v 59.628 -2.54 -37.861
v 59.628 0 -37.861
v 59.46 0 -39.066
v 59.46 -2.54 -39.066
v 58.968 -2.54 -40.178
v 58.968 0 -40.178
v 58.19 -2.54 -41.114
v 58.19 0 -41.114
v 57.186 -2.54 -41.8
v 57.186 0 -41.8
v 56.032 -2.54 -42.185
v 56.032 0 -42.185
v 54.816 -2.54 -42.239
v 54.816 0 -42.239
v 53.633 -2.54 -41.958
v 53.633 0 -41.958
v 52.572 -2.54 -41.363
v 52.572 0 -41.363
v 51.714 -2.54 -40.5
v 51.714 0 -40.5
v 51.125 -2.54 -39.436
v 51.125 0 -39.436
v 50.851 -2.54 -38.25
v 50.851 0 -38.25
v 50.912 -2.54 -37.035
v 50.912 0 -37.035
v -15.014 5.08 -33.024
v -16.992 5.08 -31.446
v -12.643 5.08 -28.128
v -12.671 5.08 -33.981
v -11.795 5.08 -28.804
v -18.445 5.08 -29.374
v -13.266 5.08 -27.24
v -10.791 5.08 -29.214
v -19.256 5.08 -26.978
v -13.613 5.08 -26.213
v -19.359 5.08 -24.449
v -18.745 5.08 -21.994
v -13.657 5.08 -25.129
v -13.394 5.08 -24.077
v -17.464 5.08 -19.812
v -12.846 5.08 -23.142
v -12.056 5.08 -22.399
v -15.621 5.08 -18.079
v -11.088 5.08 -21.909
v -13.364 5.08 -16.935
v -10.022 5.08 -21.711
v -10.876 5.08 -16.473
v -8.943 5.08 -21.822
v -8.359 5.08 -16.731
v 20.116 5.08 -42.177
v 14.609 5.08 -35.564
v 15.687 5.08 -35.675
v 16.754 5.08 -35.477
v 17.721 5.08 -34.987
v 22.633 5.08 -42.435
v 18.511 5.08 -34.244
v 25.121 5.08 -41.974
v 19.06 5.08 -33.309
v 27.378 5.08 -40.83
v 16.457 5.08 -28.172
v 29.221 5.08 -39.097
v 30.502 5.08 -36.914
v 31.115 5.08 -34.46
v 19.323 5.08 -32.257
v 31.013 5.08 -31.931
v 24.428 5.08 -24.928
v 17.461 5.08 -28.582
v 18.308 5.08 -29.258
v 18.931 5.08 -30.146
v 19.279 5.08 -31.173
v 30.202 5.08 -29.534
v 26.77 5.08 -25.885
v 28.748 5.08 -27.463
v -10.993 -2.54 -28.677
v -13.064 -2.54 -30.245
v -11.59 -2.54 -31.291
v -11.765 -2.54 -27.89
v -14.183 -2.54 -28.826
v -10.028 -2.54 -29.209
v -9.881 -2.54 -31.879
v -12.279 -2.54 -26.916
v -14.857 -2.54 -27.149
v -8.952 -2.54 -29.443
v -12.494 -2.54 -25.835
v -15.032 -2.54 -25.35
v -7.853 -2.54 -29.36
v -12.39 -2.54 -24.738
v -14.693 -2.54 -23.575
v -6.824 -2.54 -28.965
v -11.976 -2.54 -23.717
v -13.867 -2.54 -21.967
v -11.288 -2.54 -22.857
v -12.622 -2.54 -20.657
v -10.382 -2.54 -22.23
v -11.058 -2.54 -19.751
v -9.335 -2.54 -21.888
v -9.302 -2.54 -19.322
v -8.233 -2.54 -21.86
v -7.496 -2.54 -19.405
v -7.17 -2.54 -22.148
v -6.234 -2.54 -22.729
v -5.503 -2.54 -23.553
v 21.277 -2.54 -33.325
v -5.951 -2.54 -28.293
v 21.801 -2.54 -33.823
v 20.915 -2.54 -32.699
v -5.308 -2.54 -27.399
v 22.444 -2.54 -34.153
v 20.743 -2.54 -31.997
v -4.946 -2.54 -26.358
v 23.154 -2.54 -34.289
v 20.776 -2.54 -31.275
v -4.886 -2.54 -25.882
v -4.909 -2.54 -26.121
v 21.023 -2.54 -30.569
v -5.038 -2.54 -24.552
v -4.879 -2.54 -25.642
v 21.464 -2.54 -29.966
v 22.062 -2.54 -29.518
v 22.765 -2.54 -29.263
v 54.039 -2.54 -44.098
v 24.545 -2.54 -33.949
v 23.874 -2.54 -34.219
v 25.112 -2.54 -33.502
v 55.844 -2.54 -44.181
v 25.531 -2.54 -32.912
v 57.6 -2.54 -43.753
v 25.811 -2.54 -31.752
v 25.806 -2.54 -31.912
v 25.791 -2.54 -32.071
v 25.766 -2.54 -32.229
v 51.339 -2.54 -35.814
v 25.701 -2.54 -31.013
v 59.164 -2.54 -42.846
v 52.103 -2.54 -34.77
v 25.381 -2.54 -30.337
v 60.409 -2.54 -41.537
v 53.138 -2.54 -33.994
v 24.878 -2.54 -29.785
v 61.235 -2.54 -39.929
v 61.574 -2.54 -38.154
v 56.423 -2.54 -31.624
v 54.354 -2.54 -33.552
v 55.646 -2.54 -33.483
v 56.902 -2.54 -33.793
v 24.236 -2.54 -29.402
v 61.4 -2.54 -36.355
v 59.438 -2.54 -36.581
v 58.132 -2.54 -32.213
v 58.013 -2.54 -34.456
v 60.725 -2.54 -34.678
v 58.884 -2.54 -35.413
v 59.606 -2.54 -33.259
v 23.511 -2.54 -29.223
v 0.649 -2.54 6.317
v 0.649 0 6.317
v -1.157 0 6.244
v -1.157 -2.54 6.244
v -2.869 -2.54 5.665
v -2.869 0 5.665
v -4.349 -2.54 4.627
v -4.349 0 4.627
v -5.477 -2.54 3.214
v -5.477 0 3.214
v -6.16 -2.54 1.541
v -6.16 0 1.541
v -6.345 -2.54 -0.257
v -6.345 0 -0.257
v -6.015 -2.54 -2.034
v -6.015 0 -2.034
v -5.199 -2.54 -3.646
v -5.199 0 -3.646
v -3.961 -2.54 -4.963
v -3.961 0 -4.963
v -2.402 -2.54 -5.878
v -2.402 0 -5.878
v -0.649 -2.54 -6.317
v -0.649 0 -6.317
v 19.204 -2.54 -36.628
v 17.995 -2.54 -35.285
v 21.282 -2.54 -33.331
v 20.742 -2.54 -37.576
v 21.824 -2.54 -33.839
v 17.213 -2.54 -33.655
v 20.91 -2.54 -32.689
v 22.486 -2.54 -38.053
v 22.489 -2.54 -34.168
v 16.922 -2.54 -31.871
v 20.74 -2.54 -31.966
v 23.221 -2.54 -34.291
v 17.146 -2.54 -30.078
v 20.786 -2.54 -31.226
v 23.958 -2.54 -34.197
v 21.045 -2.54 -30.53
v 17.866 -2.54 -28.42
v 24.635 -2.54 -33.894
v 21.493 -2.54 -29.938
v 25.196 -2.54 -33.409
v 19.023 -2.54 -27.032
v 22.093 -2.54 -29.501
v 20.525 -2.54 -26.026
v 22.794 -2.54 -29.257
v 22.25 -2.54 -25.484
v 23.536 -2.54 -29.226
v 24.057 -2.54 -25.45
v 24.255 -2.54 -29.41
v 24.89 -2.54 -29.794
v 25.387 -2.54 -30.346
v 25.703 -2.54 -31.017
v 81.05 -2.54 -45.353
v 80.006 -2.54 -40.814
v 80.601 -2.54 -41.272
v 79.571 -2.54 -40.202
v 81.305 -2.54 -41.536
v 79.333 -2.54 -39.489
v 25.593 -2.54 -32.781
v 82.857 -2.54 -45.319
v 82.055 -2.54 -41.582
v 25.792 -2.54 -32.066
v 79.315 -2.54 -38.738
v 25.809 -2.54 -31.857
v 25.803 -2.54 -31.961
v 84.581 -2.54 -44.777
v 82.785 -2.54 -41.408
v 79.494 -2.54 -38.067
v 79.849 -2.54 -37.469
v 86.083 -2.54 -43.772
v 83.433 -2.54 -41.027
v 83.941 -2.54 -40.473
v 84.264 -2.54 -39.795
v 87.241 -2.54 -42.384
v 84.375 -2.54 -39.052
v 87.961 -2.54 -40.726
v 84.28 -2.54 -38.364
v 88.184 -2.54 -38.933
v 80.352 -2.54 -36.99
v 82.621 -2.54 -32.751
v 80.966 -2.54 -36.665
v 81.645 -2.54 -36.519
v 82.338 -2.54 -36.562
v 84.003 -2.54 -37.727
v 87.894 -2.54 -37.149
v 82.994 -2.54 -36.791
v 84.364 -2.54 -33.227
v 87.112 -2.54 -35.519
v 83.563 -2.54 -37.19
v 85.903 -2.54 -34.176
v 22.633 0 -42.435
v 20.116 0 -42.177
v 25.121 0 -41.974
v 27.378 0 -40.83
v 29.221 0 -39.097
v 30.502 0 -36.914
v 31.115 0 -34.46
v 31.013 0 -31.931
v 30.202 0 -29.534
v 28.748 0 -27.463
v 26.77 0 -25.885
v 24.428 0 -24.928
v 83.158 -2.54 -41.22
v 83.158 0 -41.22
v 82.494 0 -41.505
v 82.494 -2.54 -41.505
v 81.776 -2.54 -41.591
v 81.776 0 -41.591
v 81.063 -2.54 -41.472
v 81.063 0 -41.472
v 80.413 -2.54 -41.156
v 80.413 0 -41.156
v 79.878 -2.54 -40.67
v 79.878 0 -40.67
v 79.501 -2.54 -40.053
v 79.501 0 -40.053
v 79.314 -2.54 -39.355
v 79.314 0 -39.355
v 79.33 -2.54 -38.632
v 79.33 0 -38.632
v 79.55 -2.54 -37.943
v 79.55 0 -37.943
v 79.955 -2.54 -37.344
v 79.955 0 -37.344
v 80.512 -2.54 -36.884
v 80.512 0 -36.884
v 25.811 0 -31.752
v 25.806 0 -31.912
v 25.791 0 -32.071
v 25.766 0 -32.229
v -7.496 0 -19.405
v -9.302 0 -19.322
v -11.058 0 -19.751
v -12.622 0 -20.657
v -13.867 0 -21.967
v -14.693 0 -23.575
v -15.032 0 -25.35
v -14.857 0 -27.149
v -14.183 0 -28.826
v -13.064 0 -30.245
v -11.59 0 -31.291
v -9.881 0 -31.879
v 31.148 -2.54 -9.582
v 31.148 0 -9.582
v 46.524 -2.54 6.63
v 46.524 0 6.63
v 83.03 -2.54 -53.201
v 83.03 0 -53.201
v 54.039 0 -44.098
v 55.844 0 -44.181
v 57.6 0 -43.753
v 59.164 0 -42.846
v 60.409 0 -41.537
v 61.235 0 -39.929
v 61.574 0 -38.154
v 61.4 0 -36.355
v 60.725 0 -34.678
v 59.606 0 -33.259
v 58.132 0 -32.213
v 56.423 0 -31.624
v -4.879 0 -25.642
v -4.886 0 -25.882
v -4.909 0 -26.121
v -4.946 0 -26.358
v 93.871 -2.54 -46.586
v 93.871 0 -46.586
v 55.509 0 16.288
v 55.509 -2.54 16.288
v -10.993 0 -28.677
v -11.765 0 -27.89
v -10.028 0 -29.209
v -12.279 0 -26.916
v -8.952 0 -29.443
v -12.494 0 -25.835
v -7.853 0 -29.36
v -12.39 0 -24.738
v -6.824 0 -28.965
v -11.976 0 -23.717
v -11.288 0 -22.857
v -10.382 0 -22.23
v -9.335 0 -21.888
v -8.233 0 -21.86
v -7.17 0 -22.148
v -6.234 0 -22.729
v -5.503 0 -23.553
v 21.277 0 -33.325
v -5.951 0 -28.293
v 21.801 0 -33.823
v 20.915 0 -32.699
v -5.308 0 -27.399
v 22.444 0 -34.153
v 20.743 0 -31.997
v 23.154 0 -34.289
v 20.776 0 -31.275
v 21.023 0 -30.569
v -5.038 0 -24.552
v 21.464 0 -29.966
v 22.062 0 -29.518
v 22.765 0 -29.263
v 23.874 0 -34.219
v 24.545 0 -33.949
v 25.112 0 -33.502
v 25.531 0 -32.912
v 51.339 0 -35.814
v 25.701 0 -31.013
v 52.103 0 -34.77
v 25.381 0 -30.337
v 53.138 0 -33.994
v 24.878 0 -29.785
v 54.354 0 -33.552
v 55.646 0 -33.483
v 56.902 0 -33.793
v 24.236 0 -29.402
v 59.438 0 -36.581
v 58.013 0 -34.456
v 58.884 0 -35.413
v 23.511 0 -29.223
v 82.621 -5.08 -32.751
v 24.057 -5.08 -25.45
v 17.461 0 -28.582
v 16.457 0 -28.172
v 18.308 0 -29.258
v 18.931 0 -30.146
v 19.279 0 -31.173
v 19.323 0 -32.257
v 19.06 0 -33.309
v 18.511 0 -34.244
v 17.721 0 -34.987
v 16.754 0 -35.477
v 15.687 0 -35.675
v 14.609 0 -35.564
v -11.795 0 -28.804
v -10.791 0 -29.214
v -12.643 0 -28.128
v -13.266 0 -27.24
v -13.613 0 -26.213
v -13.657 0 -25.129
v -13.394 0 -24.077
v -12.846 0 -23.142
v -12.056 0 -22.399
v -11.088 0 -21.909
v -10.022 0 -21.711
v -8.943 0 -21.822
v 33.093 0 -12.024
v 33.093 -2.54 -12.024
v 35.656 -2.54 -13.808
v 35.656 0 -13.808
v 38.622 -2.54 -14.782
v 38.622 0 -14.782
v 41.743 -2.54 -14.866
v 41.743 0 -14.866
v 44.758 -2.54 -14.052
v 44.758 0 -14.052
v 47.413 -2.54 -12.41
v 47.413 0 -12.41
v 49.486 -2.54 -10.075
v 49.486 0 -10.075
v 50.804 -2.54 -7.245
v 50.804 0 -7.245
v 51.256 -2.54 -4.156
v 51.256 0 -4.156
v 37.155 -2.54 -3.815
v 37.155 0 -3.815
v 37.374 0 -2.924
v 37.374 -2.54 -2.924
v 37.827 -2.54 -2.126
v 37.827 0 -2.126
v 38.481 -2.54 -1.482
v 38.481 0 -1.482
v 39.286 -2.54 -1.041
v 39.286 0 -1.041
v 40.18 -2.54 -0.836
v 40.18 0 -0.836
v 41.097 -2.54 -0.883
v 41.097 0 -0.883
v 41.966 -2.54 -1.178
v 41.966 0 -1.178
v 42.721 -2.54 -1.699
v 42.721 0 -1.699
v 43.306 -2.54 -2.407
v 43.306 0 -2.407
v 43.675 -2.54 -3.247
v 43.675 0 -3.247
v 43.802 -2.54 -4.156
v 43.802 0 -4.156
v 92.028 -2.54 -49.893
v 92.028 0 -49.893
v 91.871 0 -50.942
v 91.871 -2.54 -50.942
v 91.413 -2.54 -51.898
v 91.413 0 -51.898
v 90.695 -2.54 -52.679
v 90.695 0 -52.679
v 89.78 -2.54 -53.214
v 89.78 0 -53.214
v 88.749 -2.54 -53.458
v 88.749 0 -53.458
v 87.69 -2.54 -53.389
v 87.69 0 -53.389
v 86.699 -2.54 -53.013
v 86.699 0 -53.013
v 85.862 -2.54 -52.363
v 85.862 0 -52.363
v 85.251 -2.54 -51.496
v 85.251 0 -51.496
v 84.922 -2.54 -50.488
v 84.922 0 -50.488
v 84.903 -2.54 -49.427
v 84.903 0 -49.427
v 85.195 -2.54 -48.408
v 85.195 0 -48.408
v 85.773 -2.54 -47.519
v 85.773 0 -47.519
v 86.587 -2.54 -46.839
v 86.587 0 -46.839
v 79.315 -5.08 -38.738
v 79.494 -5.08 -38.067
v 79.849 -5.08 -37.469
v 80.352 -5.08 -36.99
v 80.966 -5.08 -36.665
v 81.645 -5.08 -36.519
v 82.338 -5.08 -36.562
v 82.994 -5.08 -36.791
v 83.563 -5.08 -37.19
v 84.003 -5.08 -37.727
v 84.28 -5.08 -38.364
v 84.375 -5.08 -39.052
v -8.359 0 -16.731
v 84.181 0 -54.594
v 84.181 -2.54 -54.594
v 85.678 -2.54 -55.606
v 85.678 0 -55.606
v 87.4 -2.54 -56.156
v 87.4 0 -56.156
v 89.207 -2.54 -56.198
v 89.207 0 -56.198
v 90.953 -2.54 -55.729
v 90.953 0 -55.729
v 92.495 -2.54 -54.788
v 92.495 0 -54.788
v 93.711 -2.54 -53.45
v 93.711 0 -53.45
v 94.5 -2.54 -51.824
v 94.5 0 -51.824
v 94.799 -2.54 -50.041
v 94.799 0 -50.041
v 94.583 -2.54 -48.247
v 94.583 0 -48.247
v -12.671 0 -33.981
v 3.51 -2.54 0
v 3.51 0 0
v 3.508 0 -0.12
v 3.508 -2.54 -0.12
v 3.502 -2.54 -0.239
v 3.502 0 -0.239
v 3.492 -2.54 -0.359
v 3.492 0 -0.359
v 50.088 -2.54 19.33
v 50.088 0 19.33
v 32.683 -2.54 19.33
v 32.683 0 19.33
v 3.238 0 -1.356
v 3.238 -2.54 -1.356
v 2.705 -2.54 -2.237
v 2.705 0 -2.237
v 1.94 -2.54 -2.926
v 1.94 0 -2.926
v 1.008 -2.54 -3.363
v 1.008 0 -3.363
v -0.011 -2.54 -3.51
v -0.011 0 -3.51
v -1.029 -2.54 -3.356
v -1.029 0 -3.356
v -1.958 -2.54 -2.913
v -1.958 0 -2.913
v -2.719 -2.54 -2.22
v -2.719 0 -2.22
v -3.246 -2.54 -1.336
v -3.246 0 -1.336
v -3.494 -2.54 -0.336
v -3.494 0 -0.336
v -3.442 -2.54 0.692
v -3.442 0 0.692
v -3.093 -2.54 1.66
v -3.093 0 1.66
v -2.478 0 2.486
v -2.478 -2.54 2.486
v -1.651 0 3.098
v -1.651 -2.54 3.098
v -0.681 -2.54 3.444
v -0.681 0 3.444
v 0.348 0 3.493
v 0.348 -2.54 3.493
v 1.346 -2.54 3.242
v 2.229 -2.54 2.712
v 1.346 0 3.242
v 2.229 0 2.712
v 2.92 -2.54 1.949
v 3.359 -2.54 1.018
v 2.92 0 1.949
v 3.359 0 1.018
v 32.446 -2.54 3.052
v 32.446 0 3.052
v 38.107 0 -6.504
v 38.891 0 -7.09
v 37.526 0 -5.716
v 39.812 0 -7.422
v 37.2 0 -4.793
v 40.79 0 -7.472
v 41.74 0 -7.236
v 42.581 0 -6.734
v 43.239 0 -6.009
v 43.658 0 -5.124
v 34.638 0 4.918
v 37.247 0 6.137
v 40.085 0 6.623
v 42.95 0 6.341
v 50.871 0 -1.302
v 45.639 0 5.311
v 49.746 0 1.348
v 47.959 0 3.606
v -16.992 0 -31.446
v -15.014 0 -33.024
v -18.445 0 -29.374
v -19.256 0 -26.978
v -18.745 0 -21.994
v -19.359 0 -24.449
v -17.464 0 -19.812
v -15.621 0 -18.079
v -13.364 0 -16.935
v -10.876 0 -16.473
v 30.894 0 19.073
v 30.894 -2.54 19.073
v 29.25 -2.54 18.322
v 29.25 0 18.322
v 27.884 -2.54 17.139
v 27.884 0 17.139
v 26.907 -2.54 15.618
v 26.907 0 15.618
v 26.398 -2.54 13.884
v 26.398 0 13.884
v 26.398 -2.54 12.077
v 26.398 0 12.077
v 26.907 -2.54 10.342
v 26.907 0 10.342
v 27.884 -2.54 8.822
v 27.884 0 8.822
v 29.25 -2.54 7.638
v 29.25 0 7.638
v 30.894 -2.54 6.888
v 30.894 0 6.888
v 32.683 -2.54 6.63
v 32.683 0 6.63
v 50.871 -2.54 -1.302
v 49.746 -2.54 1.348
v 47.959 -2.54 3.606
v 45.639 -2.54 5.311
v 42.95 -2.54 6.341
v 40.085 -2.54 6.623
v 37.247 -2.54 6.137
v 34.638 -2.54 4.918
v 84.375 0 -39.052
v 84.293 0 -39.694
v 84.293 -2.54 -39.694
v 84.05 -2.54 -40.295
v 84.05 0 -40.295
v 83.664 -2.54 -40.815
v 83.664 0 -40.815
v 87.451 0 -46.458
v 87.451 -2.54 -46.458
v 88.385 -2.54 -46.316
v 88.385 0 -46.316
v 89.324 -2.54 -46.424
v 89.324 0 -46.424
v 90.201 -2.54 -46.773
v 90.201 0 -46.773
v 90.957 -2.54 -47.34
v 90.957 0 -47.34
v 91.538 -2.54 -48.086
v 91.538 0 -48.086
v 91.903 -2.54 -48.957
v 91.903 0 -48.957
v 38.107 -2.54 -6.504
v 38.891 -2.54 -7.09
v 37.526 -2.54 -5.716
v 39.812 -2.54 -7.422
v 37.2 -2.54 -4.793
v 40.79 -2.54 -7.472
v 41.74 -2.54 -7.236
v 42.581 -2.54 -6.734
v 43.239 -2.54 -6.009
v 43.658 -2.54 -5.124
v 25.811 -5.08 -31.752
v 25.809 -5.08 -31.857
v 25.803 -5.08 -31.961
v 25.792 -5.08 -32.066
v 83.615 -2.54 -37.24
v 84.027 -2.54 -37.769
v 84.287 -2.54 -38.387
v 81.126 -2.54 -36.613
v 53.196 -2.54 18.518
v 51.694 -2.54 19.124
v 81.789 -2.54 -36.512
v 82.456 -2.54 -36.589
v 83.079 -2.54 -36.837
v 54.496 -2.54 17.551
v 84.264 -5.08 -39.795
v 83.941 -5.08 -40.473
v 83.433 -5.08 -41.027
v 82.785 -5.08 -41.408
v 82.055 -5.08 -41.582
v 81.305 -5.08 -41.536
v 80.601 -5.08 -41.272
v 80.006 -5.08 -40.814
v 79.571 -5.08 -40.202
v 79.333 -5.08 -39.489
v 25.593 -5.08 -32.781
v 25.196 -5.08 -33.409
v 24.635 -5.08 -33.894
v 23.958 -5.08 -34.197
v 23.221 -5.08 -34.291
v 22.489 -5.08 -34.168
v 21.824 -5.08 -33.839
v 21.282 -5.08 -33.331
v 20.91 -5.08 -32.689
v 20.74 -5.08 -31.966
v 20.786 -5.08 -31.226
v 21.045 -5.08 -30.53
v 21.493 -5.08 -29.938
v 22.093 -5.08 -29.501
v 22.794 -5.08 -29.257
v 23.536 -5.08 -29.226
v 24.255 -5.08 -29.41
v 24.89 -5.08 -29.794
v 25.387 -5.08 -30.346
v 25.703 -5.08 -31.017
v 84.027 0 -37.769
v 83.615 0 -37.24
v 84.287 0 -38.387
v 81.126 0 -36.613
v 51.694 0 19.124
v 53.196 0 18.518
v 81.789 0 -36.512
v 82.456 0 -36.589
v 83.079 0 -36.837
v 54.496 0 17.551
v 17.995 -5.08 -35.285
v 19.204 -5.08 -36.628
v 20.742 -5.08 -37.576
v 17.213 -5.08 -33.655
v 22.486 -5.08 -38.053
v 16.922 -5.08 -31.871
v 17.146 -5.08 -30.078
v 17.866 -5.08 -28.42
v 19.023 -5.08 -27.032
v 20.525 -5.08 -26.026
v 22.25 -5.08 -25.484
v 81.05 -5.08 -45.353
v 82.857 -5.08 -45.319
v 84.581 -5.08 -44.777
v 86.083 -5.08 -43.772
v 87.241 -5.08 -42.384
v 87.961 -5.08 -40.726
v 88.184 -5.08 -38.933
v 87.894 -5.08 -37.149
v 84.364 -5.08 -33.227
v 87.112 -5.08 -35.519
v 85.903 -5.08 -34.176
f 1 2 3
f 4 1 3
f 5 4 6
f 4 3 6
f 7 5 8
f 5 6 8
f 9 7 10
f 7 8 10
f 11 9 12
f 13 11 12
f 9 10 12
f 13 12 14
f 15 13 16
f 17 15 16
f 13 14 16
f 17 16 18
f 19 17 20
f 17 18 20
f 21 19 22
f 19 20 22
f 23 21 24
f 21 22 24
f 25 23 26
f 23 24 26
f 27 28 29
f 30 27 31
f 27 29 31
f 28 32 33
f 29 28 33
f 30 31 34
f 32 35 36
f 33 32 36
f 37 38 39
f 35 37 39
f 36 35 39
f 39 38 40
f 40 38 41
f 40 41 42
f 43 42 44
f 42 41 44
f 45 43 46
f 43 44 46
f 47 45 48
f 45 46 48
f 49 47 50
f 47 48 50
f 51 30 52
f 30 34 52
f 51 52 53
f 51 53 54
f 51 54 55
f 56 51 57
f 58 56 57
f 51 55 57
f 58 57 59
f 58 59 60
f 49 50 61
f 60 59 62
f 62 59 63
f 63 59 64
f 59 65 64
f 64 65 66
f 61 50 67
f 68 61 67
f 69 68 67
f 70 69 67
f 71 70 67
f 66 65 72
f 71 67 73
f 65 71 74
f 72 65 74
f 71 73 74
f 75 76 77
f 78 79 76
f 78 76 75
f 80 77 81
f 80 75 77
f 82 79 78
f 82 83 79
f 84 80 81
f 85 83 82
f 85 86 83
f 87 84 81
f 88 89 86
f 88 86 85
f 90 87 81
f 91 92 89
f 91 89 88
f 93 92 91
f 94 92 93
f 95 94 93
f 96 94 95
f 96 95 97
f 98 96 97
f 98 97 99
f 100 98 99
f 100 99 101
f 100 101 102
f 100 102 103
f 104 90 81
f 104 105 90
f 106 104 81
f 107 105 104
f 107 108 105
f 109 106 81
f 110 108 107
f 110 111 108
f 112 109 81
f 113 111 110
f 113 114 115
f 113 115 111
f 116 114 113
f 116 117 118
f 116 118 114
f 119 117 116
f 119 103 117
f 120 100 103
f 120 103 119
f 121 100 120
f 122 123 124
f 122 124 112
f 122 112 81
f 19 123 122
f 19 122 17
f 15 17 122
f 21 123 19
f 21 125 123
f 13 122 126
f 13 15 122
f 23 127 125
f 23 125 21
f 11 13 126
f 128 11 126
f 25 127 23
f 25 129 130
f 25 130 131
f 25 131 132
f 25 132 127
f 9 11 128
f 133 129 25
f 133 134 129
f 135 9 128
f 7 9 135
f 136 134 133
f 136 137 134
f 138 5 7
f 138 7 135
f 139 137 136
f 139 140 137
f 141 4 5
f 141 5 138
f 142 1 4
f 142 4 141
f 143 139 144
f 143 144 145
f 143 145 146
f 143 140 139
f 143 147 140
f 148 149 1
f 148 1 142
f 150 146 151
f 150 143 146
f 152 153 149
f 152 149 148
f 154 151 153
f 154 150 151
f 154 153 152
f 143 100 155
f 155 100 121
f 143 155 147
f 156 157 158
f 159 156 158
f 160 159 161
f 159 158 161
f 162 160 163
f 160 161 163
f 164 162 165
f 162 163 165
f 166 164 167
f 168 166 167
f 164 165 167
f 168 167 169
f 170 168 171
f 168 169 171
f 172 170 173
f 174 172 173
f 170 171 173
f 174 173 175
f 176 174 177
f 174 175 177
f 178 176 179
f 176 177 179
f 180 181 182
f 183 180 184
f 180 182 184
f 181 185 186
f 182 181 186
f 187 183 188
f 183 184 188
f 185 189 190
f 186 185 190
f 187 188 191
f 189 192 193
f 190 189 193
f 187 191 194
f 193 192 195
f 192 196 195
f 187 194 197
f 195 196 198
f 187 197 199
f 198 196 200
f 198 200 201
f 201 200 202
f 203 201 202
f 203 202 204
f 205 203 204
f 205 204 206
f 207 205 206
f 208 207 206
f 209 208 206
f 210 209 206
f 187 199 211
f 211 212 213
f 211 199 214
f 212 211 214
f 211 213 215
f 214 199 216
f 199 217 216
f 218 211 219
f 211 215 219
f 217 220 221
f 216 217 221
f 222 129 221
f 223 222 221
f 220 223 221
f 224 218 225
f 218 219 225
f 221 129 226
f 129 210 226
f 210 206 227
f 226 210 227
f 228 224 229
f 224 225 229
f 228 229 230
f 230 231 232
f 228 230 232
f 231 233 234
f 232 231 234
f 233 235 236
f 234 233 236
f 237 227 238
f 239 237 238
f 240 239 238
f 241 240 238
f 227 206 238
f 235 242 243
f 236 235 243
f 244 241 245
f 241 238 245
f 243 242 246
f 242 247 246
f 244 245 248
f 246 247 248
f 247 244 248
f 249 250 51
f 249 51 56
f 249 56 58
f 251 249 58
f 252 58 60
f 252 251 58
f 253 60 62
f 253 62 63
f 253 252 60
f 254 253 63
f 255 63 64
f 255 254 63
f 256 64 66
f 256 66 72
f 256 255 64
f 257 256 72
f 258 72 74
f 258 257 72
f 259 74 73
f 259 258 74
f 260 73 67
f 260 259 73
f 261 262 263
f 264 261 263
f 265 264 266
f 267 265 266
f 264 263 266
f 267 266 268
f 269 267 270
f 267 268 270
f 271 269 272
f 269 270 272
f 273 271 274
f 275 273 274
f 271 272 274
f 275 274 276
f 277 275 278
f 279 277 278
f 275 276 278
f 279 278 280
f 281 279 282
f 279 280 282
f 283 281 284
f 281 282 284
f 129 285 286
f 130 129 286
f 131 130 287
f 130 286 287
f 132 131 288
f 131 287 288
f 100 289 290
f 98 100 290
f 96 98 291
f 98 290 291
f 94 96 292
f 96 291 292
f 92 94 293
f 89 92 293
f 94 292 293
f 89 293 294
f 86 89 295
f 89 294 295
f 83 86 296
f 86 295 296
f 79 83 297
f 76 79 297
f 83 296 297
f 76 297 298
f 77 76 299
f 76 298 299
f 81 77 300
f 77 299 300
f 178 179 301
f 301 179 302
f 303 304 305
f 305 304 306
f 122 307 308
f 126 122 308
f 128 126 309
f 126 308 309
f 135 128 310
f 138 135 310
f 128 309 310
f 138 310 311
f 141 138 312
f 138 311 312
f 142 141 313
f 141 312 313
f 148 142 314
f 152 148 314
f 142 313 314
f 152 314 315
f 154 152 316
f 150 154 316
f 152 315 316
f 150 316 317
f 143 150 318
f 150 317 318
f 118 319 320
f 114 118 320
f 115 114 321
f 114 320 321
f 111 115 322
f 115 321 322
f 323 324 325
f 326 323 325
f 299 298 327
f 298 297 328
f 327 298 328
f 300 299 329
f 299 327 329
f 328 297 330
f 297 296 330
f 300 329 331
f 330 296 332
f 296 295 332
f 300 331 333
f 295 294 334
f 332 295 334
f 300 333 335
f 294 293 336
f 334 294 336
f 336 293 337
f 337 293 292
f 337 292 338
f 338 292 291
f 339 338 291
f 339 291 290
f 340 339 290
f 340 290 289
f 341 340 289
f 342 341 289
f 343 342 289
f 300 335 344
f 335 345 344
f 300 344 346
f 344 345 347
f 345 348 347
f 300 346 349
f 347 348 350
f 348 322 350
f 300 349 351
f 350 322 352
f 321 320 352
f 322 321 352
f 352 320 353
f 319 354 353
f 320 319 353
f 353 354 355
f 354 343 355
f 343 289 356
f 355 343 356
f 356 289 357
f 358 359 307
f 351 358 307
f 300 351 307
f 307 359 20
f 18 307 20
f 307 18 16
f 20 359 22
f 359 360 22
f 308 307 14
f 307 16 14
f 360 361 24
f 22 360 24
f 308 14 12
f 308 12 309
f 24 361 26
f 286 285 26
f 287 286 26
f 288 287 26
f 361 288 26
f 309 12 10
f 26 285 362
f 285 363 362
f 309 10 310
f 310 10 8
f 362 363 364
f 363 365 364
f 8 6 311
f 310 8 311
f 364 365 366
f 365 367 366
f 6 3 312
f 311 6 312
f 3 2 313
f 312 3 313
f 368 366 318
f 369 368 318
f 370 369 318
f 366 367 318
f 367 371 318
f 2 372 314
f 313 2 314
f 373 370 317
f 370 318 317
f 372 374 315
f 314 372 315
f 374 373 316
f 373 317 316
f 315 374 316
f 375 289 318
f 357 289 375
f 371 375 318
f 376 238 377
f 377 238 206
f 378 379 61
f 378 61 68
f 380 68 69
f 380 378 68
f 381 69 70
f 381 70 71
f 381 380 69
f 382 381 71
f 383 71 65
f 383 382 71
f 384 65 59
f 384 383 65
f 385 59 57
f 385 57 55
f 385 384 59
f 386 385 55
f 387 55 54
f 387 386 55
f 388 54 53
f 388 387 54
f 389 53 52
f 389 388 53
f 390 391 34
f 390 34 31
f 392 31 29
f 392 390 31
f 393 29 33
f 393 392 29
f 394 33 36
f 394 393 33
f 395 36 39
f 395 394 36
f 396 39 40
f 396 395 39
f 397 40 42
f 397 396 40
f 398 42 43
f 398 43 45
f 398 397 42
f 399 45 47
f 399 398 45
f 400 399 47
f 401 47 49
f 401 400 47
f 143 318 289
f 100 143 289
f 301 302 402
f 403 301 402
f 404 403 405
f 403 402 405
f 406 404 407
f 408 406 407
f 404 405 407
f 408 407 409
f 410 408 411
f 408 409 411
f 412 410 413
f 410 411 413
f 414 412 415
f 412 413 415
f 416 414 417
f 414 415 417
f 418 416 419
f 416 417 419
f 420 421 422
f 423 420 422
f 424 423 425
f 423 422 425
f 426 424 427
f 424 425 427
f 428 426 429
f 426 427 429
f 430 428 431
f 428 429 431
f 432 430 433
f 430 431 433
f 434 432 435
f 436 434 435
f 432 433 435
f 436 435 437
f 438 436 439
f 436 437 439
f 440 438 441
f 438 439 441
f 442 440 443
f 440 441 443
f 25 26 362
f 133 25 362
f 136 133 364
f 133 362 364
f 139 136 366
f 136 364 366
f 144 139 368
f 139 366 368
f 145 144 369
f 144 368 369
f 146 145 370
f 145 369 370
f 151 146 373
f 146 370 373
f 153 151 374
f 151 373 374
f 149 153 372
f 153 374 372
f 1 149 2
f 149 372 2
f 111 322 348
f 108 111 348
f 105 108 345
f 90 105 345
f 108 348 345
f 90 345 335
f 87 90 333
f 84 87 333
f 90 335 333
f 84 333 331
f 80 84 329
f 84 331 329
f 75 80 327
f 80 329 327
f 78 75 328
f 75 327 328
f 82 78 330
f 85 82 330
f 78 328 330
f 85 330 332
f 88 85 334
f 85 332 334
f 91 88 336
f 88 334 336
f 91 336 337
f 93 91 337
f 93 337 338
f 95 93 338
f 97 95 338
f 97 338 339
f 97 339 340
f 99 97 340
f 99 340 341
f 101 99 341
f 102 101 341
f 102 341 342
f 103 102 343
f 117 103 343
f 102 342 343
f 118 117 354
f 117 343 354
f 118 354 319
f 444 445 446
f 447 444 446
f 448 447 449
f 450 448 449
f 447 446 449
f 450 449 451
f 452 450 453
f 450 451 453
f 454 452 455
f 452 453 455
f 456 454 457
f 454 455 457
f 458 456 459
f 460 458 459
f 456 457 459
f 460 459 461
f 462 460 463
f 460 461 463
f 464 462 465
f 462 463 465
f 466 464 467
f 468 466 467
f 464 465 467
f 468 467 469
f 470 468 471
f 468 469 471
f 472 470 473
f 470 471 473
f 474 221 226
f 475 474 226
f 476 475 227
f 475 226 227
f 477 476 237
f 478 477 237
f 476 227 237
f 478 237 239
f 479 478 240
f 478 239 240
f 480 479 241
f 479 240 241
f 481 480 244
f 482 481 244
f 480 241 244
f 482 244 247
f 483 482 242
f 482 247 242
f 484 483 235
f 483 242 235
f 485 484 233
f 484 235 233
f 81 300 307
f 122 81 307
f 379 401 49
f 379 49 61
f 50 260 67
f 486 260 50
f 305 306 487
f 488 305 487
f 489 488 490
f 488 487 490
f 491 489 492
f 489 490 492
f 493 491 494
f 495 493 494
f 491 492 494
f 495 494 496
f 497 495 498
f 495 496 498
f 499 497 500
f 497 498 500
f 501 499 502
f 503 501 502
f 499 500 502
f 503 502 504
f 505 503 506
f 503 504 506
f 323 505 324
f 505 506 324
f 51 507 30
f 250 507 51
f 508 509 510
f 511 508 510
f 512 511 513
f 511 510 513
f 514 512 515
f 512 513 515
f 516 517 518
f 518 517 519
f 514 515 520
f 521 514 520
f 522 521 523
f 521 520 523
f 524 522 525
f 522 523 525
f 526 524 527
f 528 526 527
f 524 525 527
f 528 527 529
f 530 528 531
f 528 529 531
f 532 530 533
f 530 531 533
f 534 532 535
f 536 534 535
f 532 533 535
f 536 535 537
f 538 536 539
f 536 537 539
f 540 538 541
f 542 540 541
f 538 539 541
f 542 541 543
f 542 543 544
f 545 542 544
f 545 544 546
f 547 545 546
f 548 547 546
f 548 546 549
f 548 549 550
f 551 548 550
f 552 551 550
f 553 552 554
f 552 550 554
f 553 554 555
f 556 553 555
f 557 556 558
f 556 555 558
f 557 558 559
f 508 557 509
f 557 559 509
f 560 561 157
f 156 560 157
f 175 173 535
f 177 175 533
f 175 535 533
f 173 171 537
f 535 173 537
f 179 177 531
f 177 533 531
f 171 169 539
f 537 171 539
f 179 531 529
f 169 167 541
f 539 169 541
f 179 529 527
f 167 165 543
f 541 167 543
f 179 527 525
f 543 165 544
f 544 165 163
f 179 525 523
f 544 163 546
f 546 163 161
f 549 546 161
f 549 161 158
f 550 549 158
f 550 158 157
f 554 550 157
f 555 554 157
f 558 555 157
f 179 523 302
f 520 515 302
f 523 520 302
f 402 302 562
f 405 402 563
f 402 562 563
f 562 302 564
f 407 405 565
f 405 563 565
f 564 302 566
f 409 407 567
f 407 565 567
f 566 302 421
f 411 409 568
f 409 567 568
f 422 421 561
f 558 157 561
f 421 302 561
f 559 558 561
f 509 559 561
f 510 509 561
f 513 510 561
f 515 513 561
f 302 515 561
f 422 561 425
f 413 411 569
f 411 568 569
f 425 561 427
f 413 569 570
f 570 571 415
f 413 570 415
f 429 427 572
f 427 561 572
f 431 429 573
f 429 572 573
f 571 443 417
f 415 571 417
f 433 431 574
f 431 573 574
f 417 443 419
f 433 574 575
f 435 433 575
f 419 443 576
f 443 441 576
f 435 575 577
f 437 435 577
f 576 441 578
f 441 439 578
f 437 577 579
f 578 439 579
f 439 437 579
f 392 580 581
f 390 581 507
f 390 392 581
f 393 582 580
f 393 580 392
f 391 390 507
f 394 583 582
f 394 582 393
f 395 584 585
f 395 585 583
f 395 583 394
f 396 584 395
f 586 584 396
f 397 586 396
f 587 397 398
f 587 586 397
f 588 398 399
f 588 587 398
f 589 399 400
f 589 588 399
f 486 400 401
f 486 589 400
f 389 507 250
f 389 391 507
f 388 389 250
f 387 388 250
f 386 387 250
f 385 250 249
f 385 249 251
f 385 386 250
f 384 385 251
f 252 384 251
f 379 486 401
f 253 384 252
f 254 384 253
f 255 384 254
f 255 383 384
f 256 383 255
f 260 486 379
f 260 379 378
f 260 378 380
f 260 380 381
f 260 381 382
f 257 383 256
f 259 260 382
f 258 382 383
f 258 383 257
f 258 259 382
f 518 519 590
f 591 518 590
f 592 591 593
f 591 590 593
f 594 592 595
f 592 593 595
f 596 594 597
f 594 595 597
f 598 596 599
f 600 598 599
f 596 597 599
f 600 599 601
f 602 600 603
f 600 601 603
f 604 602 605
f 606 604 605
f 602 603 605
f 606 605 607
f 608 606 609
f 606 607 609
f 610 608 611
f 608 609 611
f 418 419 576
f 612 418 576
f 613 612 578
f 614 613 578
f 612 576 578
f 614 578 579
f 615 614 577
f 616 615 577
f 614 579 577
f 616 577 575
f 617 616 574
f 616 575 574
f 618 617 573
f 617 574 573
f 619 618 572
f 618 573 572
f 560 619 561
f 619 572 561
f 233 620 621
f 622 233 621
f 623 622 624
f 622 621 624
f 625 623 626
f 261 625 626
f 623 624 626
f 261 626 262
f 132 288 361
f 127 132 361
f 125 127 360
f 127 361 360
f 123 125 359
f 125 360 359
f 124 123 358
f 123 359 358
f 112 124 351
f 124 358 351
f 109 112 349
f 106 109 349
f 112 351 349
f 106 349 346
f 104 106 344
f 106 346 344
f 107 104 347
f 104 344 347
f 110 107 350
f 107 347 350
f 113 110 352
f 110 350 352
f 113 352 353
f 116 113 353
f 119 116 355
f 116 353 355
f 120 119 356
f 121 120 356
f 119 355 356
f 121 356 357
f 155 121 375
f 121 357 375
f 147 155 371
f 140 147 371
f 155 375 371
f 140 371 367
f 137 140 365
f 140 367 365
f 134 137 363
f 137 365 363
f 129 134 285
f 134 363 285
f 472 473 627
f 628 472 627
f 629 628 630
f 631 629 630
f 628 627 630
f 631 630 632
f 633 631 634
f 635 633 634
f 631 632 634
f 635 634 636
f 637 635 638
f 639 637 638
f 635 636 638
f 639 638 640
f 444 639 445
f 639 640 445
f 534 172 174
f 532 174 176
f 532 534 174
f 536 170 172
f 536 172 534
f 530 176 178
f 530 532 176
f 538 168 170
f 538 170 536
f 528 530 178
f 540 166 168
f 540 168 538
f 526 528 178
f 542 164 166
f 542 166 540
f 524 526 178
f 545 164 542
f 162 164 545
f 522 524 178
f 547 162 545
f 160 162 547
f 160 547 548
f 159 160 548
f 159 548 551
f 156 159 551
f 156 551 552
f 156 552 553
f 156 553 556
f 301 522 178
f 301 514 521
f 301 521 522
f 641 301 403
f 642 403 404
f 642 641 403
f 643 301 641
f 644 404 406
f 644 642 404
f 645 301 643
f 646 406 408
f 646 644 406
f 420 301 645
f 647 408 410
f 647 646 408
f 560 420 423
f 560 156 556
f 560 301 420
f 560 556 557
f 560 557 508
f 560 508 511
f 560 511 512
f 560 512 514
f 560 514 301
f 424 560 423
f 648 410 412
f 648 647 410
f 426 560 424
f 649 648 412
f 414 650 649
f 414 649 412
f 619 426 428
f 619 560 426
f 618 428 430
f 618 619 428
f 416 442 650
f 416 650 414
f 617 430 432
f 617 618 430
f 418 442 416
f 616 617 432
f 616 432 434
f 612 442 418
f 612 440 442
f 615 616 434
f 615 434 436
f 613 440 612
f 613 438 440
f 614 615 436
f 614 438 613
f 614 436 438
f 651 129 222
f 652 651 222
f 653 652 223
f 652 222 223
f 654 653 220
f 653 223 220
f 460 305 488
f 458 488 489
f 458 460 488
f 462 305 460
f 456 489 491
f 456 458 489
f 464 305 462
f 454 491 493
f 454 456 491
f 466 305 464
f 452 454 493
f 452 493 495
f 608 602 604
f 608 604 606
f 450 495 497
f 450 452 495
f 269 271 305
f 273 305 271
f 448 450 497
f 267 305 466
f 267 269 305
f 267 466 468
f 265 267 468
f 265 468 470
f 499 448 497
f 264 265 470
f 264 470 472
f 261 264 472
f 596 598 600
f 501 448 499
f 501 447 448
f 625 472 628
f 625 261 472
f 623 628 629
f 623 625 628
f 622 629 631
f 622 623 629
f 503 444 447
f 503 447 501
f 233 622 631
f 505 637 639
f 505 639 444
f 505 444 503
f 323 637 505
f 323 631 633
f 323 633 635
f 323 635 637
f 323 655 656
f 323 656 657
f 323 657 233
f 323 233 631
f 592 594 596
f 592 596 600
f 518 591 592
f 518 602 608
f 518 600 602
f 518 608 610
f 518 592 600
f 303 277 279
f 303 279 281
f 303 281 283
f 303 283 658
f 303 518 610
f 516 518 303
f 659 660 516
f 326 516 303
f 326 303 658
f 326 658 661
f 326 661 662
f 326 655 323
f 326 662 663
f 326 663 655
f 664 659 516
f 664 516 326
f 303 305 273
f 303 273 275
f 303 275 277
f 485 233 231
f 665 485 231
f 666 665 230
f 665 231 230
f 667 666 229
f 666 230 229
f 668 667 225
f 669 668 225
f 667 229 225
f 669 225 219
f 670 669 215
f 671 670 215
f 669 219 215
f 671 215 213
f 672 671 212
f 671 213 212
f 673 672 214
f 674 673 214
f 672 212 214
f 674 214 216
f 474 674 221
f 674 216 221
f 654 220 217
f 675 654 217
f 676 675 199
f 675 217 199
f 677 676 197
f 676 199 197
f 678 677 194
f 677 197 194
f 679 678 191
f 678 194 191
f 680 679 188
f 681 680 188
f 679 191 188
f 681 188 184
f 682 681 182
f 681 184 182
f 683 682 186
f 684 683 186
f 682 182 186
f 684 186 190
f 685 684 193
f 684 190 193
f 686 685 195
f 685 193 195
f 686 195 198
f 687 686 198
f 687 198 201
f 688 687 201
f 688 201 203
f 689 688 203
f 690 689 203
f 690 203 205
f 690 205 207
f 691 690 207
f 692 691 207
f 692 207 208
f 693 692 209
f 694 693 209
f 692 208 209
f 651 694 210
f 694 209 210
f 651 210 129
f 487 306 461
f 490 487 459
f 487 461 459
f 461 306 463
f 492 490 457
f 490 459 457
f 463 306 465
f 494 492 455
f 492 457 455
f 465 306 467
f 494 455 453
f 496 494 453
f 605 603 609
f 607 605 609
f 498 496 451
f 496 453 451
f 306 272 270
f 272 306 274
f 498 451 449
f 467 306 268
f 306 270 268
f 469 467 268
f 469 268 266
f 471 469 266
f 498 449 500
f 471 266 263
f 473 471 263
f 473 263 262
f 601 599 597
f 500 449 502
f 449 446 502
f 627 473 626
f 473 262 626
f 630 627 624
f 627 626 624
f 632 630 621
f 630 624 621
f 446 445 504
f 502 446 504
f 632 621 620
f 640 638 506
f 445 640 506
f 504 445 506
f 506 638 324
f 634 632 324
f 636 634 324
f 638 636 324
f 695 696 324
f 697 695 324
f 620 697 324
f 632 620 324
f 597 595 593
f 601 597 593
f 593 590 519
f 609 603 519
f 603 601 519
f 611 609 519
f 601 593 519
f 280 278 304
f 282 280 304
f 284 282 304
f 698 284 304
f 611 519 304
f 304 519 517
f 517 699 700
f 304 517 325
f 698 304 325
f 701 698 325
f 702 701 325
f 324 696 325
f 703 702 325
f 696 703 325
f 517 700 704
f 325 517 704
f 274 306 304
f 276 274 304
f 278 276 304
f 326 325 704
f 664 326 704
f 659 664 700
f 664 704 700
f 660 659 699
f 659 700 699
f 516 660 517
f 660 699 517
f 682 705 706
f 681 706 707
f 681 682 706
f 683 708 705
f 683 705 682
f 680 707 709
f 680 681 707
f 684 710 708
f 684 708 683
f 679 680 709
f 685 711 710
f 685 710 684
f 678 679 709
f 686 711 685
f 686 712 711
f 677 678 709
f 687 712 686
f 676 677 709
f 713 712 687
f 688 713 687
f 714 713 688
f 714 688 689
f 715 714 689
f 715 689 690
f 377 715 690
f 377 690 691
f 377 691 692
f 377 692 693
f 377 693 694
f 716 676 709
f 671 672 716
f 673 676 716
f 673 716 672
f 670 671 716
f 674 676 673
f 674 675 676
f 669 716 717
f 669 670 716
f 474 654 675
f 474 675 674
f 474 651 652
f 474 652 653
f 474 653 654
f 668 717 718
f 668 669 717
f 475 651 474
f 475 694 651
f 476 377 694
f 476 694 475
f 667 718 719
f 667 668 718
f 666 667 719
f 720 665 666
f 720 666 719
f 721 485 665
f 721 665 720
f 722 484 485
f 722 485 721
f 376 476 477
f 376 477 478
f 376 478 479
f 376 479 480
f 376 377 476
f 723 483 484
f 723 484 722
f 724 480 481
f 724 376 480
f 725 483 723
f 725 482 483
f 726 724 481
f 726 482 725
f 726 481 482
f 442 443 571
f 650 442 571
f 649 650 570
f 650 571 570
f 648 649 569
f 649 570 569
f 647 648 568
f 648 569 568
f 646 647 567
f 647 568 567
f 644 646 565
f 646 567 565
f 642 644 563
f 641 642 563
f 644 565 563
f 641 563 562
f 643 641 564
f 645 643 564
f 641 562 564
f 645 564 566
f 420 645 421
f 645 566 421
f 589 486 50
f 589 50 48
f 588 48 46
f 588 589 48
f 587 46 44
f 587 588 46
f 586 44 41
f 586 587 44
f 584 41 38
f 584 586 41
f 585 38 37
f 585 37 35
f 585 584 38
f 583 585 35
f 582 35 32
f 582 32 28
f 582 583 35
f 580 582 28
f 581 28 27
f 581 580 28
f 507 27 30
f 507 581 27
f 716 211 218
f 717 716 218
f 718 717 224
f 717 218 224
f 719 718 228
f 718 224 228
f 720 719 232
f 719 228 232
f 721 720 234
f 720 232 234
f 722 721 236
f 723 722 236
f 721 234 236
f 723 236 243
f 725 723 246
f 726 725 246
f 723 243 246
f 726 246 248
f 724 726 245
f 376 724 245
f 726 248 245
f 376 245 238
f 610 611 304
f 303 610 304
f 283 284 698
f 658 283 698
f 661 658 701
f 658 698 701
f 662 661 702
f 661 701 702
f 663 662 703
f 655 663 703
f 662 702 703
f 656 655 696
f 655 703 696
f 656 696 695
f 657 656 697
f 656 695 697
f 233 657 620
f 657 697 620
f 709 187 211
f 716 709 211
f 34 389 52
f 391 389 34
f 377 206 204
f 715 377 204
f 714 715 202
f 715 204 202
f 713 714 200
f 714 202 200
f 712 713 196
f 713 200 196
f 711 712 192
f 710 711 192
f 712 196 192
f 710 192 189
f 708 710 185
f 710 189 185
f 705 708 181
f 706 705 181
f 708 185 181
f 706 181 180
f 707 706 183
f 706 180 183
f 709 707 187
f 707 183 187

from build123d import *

# Parameters (mm, degrees)
F1_DEPTH = 2.54
F3_DEPTH = 5.08
F5_DEPTH = 2.54
F7_DEPTH = 2.54


with BuildPart() as f1:
    # F0 (on Front) → F1 (new body)
    with BuildSketch(Plane.XZ):
        with BuildLine():
            ThreePointArc((31.1483665572, -9.5817770253), (29.9264593037, -6.4295066964), (29.7404423096, -3.0538196197))
            ThreePointArc((29.7404423096, -3.0538196197), (30.6085917345, 0.2136231324), (32.4456119445, 3.0517954863))
            Line((32.4456119445, 3.0517954863), (0.6486226936, 6.3167862558))
            ThreePointArc((0.6486226936, 6.3167862558), (-6.3167862558, 0.6486226936), (-0.6486226936, -6.3167862558))
            Line((-0.6486226936, -6.3167862558), (31.1483665572, -9.5817770253))
        make_face()
        with BuildLine():
            ThreePointArc((3.5104216462, 0), (3.5058283163, -0.1795214477), (3.4920603475, -0.3585730935))
            ThreePointArc((3.4920603475, -0.3585730935), (-3.5058283163, 0.1795214477), (3.5104216462, 0))
        make_face(mode=Mode.SUBTRACT)
        with BuildLine():
            ThreePointArc((32.4456119445, 3.0517954863), (30.6085917345, 0.2136231324), (29.7404423096, -3.0538196197))
            ThreePointArc((29.7404423096, -3.0538196197), (29.9264593037, -6.4295066964), (31.1483665572, -9.5817770253))
            Line((31.1483665572, -9.5817770253), (39.8212547282, -10.4723298886))
            ThreePointArc((39.8212547282, -10.4723298886), (46.7866636776, -4.8041663265), (41.1185001155, 2.161242623))
            Line((41.1185001155, 2.161242623), (32.4456119445, 3.0517954863))
        make_face()
        with BuildLine():
            ThreePointArc((43.8018488142, -4.1555436328), (40.2994818431, -7.4831551945), (37.1553339422, -3.8151983951))
            ThreePointArc((37.1553339422, -3.8151983951), (40.6402730006, -0.8279320711), (43.8018488142, -4.1555436328))
        make_face(mode=Mode.SUBTRACT)
        with BuildLine():
            ThreePointArc((51.2557280433, -4.1555436328), (44.3290253099, 5.9162760244), (32.4456119445, 3.0517954863))
            Line((32.4456119445, 3.0517954863), (41.1185001155, 2.161242623))
            ThreePointArc((41.1185001155, 2.161242623), (46.7866636776, -4.8041663265), (39.8212547282, -10.4723298886))
            Line((39.8212547282, -10.4723298886), (31.1483665572, -9.5817770253))
            ThreePointArc((31.1483665572, -9.5817770253), (43.280050893, -14.5688763698), (51.2557280433, -4.1555436328))
        make_face()
    extrude(amount=F1_DEPTH)


with BuildPart() as f1b:
    # F0 (on Front) → F1, piece 2 (new body)
    with BuildSketch(Plane.XZ):
        with BuildLine():
            ThreePointArc((-7.4963600697, -19.4053518065), (-14.9256821311, -24.4501683252), (-9.8808656124, -31.8794903866))
            Line((-9.8808656124, -31.8794903866), (54.0387484568, -44.0981035642))
            ThreePointArc((54.0387484568, -44.0981035642), (61.4680705182, -39.0532870454), (56.4232539994, -31.623964984))
            Line((56.4232539994, -31.623964984), (-7.4963600697, -19.4053518065))
        make_face()
        with BuildLine():
            ThreePointArc((-4.8786128411, -25.6424210966), (-4.8955902734, -26.0016978721), (-4.946371267, -26.3577727594))
            ThreePointArc((-4.946371267, -26.3577727594), (-12.4816354087, -25.283144321), (-4.8786128411, -25.6424210966))
        make_face(mode=Mode.SUBTRACT)
        with BuildLine():
            ThreePointArc((25.7660219095, -32.2286287939), (22.794293085, -34.2465554014), (20.7763664775, -31.2748265768))
            ThreePointArc((20.7763664775, -31.2748265768), (23.5107120439, -29.2230459736), (25.8111941935, -31.7517276853))
            ThreePointArc((25.8111941935, -31.7517276853), (25.7998759053, -31.9912455357), (25.7660219095, -32.2286287939))
        make_face(mode=Mode.SUBTRACT)
        with BuildLine():
            ThreePointArc((59.6282880018, -37.8610342741), (54.8163442693, -42.2387266545), (50.9119174019, -37.035415795))
            ThreePointArc((50.9119174019, -37.035415795), (55.6456581869, -33.4833418937), (59.6282880018, -37.8610342741))
        make_face(mode=Mode.SUBTRACT)
    extrude(amount=F1_DEPTH)


with BuildPart() as f3:
    # F2 (on Front) → F3 (new body)
    with BuildSketch(Plane.XZ):
        with BuildLine():
            ThreePointArc((20.1156061917, -42.1772935621), (30.8963147246, -35.7088684423), (24.4278896049, -24.9281599095))
            Line((24.4278896049, -24.9281599095), (-8.3587867976, -16.7314908088))
            ThreePointArc((-8.3587867976, -16.7314908088), (-19.1394953305, -23.1999159286), (-12.6710702108, -33.9806244614))
            Line((-12.6710702108, -33.9806244614), (20.1156061917, -42.1772935621))
        make_face()
        with BuildLine():
            Line((14.6086621042, -35.5642133956), (-10.7913378958, -29.2142133956))
            ThreePointArc((-10.7913378958, -29.2142133956), (-13.56352009, -24.5939097387), (-8.943216433, -21.8217275445))
            Line((-8.943216433, -21.8217275445), (16.456783567, -28.1717275445))
            ThreePointArc((16.456783567, -28.1717275445), (19.2289657611, -32.7920312015), (14.6086621042, -35.5642133956))
        make_face(mode=Mode.SUBTRACT)
    extrude(amount=-F3_DEPTH)


with BuildPart() as f5:
    # F4 (on Front) → F5 (new body)
    with BuildSketch(Plane.XZ):
        with BuildLine():
            ThreePointArc((50.0881612421, 19.3303069887), (45.5980331816, 17.4704350492), (43.7381612421, 12.9803069887))
            Line((43.7381612421, 12.9803069887), (50.0881612421, 12.9803069887))
            Line((50.0881612421, 12.9803069887), (53.3955655031, 7.5596449392))
            ThreePointArc((53.3955655031, 7.5596449392), (56.2598361169, 11.486008076), (55.5088232916, 16.2877112497))
            ThreePointArc((55.5088232916, 16.2877112497), (53.1962541416, 18.5176582082), (50.0881612421, 19.3303069887))
        make_face()
        with BuildLine():
            Line((50.0881612421, 12.9803069887), (43.7381612421, 12.9803069887))
            ThreePointArc((43.7381612421, 12.9803069887), (43.9749090793, 11.2625619573), (44.6674991927, 9.6729027277))
            Line((44.6674991927, 9.6729027277), (46.5239318608, 6.6303069887))
            Line((46.5239318608, 6.6303069887), (50.0881612421, 6.6303069887))
            ThreePointArc((50.0881612421, 6.6303069887), (51.8059062736, 6.8670548258), (53.3955655031, 7.5596449392))
            Line((53.3955655031, 7.5596449392), (50.0881612421, 12.9803069887))
        make_face()
        with BuildLine():
            ThreePointArc((44.6674991927, 9.6729027277), (43.9749090793, 11.2625619573), (43.7381612421, 12.9803069887))
            ThreePointArc((43.7381612421, 12.9803069887), (45.5980331816, 17.4704350492), (50.0881612421, 19.3303069887))
            Line((50.0881612421, 19.3303069887), (32.6830678845, 19.3303069887))
            ThreePointArc((32.6830678845, 19.3303069887), (26.3330678845, 12.9803069887), (32.6830678845, 6.6303069887))
            Line((32.6830678845, 6.6303069887), (46.5239318608, 6.6303069887))
            Line((46.5239318608, 6.6303069887), (44.6674991927, 9.6729027277))
        make_face()
        with BuildLine():
            ThreePointArc((55.5088232916, 16.2877112497), (56.2598361169, 11.486008076), (53.3955655031, 7.5596449392))
            ThreePointArc((53.3955655031, 7.5596449392), (51.8059062736, 6.8670548258), (50.0881612421, 6.6303069887))
            Line((50.0881612421, 6.6303069887), (46.5239318608, 6.6303069887))
            Line((46.5239318608, 6.6303069887), (83.0295916951, -53.2005540856))
            ThreePointArc((83.0295916951, -53.2005540856), (91.7576580055, -55.3138118741), (93.870915794, -46.5857455637))
            Line((93.870915794, -46.5857455637), (55.5088232916, 16.2877112497))
        make_face()
        with BuildLine():
            ThreePointArc((92.0279713809, -49.8931498246), (86.6990917317, -53.0130048037), (86.5867957044, -46.8390398695))
            ThreePointArc((86.5867957044, -46.8390398695), (90.2014157574, -46.7732948456), (92.0279713809, -49.8931498246))
        make_face(mode=Mode.SUBTRACT)
        with BuildLine():
            ThreePointArc((83.158406927, -41.2200905455), (79.6671804029, -40.3747874301), (80.5124835183, -36.8835609059))
            ThreePointArc((80.5124835183, -36.8835609059), (83.0786823824, -36.8368852379), (84.3754452226, -39.0518257257))
            ThreePointArc((84.3754452226, -39.0518257257), (84.0503857105, -40.2950628855), (83.158406927, -41.2200905455))
        make_face(mode=Mode.SUBTRACT)
    extrude(amount=F5_DEPTH)


with BuildPart() as f7:
    # F6 (on face) → F7 (new body)
    with BuildSketch(Plane.XZ.offset(2.54)):
        with BuildLine():
            ThreePointArc((24.0566500052, -25.4504929517), (16.9699594599, -30.9662718736), (22.4857383818, -38.0529624189))
            Line((22.4857383818, -38.0529624189), (81.0499894109, -45.3530604593))
            ThreePointArc((81.0499894109, -45.3530604593), (88.1366799562, -39.8372815374), (82.6209010344, -32.7505909921))
            Line((82.6209010344, -32.7505909921), (24.0566500052, -25.4504929517))
        make_face()
        with BuildLine():
            ThreePointArc((84.3754452226, -39.0518257257), (81.6780515908, -41.5869445088), (79.3149513292, -38.737643401))
            ThreePointArc((79.3149513292, -38.737643401), (81.9928388545, -36.5167069425), (84.3754452226, -39.0518257257))
        make_face(mode=Mode.SUBTRACT)
        with BuildLine():
            ThreePointArc((25.8111941935, -31.7517276853), (25.8063129767, -31.9091213171), (25.7916880869, -32.06591001))
            ThreePointArc((25.7916880869, -32.06591001), (20.7360754104, -31.5943340535), (25.8111941935, -31.7517276853))
        make_face(mode=Mode.SUBTRACT)
    extrude(amount=F7_DEPTH)


solid = Compound([f1.part, f1b.part, f3.part, f5.part, f7.part])
